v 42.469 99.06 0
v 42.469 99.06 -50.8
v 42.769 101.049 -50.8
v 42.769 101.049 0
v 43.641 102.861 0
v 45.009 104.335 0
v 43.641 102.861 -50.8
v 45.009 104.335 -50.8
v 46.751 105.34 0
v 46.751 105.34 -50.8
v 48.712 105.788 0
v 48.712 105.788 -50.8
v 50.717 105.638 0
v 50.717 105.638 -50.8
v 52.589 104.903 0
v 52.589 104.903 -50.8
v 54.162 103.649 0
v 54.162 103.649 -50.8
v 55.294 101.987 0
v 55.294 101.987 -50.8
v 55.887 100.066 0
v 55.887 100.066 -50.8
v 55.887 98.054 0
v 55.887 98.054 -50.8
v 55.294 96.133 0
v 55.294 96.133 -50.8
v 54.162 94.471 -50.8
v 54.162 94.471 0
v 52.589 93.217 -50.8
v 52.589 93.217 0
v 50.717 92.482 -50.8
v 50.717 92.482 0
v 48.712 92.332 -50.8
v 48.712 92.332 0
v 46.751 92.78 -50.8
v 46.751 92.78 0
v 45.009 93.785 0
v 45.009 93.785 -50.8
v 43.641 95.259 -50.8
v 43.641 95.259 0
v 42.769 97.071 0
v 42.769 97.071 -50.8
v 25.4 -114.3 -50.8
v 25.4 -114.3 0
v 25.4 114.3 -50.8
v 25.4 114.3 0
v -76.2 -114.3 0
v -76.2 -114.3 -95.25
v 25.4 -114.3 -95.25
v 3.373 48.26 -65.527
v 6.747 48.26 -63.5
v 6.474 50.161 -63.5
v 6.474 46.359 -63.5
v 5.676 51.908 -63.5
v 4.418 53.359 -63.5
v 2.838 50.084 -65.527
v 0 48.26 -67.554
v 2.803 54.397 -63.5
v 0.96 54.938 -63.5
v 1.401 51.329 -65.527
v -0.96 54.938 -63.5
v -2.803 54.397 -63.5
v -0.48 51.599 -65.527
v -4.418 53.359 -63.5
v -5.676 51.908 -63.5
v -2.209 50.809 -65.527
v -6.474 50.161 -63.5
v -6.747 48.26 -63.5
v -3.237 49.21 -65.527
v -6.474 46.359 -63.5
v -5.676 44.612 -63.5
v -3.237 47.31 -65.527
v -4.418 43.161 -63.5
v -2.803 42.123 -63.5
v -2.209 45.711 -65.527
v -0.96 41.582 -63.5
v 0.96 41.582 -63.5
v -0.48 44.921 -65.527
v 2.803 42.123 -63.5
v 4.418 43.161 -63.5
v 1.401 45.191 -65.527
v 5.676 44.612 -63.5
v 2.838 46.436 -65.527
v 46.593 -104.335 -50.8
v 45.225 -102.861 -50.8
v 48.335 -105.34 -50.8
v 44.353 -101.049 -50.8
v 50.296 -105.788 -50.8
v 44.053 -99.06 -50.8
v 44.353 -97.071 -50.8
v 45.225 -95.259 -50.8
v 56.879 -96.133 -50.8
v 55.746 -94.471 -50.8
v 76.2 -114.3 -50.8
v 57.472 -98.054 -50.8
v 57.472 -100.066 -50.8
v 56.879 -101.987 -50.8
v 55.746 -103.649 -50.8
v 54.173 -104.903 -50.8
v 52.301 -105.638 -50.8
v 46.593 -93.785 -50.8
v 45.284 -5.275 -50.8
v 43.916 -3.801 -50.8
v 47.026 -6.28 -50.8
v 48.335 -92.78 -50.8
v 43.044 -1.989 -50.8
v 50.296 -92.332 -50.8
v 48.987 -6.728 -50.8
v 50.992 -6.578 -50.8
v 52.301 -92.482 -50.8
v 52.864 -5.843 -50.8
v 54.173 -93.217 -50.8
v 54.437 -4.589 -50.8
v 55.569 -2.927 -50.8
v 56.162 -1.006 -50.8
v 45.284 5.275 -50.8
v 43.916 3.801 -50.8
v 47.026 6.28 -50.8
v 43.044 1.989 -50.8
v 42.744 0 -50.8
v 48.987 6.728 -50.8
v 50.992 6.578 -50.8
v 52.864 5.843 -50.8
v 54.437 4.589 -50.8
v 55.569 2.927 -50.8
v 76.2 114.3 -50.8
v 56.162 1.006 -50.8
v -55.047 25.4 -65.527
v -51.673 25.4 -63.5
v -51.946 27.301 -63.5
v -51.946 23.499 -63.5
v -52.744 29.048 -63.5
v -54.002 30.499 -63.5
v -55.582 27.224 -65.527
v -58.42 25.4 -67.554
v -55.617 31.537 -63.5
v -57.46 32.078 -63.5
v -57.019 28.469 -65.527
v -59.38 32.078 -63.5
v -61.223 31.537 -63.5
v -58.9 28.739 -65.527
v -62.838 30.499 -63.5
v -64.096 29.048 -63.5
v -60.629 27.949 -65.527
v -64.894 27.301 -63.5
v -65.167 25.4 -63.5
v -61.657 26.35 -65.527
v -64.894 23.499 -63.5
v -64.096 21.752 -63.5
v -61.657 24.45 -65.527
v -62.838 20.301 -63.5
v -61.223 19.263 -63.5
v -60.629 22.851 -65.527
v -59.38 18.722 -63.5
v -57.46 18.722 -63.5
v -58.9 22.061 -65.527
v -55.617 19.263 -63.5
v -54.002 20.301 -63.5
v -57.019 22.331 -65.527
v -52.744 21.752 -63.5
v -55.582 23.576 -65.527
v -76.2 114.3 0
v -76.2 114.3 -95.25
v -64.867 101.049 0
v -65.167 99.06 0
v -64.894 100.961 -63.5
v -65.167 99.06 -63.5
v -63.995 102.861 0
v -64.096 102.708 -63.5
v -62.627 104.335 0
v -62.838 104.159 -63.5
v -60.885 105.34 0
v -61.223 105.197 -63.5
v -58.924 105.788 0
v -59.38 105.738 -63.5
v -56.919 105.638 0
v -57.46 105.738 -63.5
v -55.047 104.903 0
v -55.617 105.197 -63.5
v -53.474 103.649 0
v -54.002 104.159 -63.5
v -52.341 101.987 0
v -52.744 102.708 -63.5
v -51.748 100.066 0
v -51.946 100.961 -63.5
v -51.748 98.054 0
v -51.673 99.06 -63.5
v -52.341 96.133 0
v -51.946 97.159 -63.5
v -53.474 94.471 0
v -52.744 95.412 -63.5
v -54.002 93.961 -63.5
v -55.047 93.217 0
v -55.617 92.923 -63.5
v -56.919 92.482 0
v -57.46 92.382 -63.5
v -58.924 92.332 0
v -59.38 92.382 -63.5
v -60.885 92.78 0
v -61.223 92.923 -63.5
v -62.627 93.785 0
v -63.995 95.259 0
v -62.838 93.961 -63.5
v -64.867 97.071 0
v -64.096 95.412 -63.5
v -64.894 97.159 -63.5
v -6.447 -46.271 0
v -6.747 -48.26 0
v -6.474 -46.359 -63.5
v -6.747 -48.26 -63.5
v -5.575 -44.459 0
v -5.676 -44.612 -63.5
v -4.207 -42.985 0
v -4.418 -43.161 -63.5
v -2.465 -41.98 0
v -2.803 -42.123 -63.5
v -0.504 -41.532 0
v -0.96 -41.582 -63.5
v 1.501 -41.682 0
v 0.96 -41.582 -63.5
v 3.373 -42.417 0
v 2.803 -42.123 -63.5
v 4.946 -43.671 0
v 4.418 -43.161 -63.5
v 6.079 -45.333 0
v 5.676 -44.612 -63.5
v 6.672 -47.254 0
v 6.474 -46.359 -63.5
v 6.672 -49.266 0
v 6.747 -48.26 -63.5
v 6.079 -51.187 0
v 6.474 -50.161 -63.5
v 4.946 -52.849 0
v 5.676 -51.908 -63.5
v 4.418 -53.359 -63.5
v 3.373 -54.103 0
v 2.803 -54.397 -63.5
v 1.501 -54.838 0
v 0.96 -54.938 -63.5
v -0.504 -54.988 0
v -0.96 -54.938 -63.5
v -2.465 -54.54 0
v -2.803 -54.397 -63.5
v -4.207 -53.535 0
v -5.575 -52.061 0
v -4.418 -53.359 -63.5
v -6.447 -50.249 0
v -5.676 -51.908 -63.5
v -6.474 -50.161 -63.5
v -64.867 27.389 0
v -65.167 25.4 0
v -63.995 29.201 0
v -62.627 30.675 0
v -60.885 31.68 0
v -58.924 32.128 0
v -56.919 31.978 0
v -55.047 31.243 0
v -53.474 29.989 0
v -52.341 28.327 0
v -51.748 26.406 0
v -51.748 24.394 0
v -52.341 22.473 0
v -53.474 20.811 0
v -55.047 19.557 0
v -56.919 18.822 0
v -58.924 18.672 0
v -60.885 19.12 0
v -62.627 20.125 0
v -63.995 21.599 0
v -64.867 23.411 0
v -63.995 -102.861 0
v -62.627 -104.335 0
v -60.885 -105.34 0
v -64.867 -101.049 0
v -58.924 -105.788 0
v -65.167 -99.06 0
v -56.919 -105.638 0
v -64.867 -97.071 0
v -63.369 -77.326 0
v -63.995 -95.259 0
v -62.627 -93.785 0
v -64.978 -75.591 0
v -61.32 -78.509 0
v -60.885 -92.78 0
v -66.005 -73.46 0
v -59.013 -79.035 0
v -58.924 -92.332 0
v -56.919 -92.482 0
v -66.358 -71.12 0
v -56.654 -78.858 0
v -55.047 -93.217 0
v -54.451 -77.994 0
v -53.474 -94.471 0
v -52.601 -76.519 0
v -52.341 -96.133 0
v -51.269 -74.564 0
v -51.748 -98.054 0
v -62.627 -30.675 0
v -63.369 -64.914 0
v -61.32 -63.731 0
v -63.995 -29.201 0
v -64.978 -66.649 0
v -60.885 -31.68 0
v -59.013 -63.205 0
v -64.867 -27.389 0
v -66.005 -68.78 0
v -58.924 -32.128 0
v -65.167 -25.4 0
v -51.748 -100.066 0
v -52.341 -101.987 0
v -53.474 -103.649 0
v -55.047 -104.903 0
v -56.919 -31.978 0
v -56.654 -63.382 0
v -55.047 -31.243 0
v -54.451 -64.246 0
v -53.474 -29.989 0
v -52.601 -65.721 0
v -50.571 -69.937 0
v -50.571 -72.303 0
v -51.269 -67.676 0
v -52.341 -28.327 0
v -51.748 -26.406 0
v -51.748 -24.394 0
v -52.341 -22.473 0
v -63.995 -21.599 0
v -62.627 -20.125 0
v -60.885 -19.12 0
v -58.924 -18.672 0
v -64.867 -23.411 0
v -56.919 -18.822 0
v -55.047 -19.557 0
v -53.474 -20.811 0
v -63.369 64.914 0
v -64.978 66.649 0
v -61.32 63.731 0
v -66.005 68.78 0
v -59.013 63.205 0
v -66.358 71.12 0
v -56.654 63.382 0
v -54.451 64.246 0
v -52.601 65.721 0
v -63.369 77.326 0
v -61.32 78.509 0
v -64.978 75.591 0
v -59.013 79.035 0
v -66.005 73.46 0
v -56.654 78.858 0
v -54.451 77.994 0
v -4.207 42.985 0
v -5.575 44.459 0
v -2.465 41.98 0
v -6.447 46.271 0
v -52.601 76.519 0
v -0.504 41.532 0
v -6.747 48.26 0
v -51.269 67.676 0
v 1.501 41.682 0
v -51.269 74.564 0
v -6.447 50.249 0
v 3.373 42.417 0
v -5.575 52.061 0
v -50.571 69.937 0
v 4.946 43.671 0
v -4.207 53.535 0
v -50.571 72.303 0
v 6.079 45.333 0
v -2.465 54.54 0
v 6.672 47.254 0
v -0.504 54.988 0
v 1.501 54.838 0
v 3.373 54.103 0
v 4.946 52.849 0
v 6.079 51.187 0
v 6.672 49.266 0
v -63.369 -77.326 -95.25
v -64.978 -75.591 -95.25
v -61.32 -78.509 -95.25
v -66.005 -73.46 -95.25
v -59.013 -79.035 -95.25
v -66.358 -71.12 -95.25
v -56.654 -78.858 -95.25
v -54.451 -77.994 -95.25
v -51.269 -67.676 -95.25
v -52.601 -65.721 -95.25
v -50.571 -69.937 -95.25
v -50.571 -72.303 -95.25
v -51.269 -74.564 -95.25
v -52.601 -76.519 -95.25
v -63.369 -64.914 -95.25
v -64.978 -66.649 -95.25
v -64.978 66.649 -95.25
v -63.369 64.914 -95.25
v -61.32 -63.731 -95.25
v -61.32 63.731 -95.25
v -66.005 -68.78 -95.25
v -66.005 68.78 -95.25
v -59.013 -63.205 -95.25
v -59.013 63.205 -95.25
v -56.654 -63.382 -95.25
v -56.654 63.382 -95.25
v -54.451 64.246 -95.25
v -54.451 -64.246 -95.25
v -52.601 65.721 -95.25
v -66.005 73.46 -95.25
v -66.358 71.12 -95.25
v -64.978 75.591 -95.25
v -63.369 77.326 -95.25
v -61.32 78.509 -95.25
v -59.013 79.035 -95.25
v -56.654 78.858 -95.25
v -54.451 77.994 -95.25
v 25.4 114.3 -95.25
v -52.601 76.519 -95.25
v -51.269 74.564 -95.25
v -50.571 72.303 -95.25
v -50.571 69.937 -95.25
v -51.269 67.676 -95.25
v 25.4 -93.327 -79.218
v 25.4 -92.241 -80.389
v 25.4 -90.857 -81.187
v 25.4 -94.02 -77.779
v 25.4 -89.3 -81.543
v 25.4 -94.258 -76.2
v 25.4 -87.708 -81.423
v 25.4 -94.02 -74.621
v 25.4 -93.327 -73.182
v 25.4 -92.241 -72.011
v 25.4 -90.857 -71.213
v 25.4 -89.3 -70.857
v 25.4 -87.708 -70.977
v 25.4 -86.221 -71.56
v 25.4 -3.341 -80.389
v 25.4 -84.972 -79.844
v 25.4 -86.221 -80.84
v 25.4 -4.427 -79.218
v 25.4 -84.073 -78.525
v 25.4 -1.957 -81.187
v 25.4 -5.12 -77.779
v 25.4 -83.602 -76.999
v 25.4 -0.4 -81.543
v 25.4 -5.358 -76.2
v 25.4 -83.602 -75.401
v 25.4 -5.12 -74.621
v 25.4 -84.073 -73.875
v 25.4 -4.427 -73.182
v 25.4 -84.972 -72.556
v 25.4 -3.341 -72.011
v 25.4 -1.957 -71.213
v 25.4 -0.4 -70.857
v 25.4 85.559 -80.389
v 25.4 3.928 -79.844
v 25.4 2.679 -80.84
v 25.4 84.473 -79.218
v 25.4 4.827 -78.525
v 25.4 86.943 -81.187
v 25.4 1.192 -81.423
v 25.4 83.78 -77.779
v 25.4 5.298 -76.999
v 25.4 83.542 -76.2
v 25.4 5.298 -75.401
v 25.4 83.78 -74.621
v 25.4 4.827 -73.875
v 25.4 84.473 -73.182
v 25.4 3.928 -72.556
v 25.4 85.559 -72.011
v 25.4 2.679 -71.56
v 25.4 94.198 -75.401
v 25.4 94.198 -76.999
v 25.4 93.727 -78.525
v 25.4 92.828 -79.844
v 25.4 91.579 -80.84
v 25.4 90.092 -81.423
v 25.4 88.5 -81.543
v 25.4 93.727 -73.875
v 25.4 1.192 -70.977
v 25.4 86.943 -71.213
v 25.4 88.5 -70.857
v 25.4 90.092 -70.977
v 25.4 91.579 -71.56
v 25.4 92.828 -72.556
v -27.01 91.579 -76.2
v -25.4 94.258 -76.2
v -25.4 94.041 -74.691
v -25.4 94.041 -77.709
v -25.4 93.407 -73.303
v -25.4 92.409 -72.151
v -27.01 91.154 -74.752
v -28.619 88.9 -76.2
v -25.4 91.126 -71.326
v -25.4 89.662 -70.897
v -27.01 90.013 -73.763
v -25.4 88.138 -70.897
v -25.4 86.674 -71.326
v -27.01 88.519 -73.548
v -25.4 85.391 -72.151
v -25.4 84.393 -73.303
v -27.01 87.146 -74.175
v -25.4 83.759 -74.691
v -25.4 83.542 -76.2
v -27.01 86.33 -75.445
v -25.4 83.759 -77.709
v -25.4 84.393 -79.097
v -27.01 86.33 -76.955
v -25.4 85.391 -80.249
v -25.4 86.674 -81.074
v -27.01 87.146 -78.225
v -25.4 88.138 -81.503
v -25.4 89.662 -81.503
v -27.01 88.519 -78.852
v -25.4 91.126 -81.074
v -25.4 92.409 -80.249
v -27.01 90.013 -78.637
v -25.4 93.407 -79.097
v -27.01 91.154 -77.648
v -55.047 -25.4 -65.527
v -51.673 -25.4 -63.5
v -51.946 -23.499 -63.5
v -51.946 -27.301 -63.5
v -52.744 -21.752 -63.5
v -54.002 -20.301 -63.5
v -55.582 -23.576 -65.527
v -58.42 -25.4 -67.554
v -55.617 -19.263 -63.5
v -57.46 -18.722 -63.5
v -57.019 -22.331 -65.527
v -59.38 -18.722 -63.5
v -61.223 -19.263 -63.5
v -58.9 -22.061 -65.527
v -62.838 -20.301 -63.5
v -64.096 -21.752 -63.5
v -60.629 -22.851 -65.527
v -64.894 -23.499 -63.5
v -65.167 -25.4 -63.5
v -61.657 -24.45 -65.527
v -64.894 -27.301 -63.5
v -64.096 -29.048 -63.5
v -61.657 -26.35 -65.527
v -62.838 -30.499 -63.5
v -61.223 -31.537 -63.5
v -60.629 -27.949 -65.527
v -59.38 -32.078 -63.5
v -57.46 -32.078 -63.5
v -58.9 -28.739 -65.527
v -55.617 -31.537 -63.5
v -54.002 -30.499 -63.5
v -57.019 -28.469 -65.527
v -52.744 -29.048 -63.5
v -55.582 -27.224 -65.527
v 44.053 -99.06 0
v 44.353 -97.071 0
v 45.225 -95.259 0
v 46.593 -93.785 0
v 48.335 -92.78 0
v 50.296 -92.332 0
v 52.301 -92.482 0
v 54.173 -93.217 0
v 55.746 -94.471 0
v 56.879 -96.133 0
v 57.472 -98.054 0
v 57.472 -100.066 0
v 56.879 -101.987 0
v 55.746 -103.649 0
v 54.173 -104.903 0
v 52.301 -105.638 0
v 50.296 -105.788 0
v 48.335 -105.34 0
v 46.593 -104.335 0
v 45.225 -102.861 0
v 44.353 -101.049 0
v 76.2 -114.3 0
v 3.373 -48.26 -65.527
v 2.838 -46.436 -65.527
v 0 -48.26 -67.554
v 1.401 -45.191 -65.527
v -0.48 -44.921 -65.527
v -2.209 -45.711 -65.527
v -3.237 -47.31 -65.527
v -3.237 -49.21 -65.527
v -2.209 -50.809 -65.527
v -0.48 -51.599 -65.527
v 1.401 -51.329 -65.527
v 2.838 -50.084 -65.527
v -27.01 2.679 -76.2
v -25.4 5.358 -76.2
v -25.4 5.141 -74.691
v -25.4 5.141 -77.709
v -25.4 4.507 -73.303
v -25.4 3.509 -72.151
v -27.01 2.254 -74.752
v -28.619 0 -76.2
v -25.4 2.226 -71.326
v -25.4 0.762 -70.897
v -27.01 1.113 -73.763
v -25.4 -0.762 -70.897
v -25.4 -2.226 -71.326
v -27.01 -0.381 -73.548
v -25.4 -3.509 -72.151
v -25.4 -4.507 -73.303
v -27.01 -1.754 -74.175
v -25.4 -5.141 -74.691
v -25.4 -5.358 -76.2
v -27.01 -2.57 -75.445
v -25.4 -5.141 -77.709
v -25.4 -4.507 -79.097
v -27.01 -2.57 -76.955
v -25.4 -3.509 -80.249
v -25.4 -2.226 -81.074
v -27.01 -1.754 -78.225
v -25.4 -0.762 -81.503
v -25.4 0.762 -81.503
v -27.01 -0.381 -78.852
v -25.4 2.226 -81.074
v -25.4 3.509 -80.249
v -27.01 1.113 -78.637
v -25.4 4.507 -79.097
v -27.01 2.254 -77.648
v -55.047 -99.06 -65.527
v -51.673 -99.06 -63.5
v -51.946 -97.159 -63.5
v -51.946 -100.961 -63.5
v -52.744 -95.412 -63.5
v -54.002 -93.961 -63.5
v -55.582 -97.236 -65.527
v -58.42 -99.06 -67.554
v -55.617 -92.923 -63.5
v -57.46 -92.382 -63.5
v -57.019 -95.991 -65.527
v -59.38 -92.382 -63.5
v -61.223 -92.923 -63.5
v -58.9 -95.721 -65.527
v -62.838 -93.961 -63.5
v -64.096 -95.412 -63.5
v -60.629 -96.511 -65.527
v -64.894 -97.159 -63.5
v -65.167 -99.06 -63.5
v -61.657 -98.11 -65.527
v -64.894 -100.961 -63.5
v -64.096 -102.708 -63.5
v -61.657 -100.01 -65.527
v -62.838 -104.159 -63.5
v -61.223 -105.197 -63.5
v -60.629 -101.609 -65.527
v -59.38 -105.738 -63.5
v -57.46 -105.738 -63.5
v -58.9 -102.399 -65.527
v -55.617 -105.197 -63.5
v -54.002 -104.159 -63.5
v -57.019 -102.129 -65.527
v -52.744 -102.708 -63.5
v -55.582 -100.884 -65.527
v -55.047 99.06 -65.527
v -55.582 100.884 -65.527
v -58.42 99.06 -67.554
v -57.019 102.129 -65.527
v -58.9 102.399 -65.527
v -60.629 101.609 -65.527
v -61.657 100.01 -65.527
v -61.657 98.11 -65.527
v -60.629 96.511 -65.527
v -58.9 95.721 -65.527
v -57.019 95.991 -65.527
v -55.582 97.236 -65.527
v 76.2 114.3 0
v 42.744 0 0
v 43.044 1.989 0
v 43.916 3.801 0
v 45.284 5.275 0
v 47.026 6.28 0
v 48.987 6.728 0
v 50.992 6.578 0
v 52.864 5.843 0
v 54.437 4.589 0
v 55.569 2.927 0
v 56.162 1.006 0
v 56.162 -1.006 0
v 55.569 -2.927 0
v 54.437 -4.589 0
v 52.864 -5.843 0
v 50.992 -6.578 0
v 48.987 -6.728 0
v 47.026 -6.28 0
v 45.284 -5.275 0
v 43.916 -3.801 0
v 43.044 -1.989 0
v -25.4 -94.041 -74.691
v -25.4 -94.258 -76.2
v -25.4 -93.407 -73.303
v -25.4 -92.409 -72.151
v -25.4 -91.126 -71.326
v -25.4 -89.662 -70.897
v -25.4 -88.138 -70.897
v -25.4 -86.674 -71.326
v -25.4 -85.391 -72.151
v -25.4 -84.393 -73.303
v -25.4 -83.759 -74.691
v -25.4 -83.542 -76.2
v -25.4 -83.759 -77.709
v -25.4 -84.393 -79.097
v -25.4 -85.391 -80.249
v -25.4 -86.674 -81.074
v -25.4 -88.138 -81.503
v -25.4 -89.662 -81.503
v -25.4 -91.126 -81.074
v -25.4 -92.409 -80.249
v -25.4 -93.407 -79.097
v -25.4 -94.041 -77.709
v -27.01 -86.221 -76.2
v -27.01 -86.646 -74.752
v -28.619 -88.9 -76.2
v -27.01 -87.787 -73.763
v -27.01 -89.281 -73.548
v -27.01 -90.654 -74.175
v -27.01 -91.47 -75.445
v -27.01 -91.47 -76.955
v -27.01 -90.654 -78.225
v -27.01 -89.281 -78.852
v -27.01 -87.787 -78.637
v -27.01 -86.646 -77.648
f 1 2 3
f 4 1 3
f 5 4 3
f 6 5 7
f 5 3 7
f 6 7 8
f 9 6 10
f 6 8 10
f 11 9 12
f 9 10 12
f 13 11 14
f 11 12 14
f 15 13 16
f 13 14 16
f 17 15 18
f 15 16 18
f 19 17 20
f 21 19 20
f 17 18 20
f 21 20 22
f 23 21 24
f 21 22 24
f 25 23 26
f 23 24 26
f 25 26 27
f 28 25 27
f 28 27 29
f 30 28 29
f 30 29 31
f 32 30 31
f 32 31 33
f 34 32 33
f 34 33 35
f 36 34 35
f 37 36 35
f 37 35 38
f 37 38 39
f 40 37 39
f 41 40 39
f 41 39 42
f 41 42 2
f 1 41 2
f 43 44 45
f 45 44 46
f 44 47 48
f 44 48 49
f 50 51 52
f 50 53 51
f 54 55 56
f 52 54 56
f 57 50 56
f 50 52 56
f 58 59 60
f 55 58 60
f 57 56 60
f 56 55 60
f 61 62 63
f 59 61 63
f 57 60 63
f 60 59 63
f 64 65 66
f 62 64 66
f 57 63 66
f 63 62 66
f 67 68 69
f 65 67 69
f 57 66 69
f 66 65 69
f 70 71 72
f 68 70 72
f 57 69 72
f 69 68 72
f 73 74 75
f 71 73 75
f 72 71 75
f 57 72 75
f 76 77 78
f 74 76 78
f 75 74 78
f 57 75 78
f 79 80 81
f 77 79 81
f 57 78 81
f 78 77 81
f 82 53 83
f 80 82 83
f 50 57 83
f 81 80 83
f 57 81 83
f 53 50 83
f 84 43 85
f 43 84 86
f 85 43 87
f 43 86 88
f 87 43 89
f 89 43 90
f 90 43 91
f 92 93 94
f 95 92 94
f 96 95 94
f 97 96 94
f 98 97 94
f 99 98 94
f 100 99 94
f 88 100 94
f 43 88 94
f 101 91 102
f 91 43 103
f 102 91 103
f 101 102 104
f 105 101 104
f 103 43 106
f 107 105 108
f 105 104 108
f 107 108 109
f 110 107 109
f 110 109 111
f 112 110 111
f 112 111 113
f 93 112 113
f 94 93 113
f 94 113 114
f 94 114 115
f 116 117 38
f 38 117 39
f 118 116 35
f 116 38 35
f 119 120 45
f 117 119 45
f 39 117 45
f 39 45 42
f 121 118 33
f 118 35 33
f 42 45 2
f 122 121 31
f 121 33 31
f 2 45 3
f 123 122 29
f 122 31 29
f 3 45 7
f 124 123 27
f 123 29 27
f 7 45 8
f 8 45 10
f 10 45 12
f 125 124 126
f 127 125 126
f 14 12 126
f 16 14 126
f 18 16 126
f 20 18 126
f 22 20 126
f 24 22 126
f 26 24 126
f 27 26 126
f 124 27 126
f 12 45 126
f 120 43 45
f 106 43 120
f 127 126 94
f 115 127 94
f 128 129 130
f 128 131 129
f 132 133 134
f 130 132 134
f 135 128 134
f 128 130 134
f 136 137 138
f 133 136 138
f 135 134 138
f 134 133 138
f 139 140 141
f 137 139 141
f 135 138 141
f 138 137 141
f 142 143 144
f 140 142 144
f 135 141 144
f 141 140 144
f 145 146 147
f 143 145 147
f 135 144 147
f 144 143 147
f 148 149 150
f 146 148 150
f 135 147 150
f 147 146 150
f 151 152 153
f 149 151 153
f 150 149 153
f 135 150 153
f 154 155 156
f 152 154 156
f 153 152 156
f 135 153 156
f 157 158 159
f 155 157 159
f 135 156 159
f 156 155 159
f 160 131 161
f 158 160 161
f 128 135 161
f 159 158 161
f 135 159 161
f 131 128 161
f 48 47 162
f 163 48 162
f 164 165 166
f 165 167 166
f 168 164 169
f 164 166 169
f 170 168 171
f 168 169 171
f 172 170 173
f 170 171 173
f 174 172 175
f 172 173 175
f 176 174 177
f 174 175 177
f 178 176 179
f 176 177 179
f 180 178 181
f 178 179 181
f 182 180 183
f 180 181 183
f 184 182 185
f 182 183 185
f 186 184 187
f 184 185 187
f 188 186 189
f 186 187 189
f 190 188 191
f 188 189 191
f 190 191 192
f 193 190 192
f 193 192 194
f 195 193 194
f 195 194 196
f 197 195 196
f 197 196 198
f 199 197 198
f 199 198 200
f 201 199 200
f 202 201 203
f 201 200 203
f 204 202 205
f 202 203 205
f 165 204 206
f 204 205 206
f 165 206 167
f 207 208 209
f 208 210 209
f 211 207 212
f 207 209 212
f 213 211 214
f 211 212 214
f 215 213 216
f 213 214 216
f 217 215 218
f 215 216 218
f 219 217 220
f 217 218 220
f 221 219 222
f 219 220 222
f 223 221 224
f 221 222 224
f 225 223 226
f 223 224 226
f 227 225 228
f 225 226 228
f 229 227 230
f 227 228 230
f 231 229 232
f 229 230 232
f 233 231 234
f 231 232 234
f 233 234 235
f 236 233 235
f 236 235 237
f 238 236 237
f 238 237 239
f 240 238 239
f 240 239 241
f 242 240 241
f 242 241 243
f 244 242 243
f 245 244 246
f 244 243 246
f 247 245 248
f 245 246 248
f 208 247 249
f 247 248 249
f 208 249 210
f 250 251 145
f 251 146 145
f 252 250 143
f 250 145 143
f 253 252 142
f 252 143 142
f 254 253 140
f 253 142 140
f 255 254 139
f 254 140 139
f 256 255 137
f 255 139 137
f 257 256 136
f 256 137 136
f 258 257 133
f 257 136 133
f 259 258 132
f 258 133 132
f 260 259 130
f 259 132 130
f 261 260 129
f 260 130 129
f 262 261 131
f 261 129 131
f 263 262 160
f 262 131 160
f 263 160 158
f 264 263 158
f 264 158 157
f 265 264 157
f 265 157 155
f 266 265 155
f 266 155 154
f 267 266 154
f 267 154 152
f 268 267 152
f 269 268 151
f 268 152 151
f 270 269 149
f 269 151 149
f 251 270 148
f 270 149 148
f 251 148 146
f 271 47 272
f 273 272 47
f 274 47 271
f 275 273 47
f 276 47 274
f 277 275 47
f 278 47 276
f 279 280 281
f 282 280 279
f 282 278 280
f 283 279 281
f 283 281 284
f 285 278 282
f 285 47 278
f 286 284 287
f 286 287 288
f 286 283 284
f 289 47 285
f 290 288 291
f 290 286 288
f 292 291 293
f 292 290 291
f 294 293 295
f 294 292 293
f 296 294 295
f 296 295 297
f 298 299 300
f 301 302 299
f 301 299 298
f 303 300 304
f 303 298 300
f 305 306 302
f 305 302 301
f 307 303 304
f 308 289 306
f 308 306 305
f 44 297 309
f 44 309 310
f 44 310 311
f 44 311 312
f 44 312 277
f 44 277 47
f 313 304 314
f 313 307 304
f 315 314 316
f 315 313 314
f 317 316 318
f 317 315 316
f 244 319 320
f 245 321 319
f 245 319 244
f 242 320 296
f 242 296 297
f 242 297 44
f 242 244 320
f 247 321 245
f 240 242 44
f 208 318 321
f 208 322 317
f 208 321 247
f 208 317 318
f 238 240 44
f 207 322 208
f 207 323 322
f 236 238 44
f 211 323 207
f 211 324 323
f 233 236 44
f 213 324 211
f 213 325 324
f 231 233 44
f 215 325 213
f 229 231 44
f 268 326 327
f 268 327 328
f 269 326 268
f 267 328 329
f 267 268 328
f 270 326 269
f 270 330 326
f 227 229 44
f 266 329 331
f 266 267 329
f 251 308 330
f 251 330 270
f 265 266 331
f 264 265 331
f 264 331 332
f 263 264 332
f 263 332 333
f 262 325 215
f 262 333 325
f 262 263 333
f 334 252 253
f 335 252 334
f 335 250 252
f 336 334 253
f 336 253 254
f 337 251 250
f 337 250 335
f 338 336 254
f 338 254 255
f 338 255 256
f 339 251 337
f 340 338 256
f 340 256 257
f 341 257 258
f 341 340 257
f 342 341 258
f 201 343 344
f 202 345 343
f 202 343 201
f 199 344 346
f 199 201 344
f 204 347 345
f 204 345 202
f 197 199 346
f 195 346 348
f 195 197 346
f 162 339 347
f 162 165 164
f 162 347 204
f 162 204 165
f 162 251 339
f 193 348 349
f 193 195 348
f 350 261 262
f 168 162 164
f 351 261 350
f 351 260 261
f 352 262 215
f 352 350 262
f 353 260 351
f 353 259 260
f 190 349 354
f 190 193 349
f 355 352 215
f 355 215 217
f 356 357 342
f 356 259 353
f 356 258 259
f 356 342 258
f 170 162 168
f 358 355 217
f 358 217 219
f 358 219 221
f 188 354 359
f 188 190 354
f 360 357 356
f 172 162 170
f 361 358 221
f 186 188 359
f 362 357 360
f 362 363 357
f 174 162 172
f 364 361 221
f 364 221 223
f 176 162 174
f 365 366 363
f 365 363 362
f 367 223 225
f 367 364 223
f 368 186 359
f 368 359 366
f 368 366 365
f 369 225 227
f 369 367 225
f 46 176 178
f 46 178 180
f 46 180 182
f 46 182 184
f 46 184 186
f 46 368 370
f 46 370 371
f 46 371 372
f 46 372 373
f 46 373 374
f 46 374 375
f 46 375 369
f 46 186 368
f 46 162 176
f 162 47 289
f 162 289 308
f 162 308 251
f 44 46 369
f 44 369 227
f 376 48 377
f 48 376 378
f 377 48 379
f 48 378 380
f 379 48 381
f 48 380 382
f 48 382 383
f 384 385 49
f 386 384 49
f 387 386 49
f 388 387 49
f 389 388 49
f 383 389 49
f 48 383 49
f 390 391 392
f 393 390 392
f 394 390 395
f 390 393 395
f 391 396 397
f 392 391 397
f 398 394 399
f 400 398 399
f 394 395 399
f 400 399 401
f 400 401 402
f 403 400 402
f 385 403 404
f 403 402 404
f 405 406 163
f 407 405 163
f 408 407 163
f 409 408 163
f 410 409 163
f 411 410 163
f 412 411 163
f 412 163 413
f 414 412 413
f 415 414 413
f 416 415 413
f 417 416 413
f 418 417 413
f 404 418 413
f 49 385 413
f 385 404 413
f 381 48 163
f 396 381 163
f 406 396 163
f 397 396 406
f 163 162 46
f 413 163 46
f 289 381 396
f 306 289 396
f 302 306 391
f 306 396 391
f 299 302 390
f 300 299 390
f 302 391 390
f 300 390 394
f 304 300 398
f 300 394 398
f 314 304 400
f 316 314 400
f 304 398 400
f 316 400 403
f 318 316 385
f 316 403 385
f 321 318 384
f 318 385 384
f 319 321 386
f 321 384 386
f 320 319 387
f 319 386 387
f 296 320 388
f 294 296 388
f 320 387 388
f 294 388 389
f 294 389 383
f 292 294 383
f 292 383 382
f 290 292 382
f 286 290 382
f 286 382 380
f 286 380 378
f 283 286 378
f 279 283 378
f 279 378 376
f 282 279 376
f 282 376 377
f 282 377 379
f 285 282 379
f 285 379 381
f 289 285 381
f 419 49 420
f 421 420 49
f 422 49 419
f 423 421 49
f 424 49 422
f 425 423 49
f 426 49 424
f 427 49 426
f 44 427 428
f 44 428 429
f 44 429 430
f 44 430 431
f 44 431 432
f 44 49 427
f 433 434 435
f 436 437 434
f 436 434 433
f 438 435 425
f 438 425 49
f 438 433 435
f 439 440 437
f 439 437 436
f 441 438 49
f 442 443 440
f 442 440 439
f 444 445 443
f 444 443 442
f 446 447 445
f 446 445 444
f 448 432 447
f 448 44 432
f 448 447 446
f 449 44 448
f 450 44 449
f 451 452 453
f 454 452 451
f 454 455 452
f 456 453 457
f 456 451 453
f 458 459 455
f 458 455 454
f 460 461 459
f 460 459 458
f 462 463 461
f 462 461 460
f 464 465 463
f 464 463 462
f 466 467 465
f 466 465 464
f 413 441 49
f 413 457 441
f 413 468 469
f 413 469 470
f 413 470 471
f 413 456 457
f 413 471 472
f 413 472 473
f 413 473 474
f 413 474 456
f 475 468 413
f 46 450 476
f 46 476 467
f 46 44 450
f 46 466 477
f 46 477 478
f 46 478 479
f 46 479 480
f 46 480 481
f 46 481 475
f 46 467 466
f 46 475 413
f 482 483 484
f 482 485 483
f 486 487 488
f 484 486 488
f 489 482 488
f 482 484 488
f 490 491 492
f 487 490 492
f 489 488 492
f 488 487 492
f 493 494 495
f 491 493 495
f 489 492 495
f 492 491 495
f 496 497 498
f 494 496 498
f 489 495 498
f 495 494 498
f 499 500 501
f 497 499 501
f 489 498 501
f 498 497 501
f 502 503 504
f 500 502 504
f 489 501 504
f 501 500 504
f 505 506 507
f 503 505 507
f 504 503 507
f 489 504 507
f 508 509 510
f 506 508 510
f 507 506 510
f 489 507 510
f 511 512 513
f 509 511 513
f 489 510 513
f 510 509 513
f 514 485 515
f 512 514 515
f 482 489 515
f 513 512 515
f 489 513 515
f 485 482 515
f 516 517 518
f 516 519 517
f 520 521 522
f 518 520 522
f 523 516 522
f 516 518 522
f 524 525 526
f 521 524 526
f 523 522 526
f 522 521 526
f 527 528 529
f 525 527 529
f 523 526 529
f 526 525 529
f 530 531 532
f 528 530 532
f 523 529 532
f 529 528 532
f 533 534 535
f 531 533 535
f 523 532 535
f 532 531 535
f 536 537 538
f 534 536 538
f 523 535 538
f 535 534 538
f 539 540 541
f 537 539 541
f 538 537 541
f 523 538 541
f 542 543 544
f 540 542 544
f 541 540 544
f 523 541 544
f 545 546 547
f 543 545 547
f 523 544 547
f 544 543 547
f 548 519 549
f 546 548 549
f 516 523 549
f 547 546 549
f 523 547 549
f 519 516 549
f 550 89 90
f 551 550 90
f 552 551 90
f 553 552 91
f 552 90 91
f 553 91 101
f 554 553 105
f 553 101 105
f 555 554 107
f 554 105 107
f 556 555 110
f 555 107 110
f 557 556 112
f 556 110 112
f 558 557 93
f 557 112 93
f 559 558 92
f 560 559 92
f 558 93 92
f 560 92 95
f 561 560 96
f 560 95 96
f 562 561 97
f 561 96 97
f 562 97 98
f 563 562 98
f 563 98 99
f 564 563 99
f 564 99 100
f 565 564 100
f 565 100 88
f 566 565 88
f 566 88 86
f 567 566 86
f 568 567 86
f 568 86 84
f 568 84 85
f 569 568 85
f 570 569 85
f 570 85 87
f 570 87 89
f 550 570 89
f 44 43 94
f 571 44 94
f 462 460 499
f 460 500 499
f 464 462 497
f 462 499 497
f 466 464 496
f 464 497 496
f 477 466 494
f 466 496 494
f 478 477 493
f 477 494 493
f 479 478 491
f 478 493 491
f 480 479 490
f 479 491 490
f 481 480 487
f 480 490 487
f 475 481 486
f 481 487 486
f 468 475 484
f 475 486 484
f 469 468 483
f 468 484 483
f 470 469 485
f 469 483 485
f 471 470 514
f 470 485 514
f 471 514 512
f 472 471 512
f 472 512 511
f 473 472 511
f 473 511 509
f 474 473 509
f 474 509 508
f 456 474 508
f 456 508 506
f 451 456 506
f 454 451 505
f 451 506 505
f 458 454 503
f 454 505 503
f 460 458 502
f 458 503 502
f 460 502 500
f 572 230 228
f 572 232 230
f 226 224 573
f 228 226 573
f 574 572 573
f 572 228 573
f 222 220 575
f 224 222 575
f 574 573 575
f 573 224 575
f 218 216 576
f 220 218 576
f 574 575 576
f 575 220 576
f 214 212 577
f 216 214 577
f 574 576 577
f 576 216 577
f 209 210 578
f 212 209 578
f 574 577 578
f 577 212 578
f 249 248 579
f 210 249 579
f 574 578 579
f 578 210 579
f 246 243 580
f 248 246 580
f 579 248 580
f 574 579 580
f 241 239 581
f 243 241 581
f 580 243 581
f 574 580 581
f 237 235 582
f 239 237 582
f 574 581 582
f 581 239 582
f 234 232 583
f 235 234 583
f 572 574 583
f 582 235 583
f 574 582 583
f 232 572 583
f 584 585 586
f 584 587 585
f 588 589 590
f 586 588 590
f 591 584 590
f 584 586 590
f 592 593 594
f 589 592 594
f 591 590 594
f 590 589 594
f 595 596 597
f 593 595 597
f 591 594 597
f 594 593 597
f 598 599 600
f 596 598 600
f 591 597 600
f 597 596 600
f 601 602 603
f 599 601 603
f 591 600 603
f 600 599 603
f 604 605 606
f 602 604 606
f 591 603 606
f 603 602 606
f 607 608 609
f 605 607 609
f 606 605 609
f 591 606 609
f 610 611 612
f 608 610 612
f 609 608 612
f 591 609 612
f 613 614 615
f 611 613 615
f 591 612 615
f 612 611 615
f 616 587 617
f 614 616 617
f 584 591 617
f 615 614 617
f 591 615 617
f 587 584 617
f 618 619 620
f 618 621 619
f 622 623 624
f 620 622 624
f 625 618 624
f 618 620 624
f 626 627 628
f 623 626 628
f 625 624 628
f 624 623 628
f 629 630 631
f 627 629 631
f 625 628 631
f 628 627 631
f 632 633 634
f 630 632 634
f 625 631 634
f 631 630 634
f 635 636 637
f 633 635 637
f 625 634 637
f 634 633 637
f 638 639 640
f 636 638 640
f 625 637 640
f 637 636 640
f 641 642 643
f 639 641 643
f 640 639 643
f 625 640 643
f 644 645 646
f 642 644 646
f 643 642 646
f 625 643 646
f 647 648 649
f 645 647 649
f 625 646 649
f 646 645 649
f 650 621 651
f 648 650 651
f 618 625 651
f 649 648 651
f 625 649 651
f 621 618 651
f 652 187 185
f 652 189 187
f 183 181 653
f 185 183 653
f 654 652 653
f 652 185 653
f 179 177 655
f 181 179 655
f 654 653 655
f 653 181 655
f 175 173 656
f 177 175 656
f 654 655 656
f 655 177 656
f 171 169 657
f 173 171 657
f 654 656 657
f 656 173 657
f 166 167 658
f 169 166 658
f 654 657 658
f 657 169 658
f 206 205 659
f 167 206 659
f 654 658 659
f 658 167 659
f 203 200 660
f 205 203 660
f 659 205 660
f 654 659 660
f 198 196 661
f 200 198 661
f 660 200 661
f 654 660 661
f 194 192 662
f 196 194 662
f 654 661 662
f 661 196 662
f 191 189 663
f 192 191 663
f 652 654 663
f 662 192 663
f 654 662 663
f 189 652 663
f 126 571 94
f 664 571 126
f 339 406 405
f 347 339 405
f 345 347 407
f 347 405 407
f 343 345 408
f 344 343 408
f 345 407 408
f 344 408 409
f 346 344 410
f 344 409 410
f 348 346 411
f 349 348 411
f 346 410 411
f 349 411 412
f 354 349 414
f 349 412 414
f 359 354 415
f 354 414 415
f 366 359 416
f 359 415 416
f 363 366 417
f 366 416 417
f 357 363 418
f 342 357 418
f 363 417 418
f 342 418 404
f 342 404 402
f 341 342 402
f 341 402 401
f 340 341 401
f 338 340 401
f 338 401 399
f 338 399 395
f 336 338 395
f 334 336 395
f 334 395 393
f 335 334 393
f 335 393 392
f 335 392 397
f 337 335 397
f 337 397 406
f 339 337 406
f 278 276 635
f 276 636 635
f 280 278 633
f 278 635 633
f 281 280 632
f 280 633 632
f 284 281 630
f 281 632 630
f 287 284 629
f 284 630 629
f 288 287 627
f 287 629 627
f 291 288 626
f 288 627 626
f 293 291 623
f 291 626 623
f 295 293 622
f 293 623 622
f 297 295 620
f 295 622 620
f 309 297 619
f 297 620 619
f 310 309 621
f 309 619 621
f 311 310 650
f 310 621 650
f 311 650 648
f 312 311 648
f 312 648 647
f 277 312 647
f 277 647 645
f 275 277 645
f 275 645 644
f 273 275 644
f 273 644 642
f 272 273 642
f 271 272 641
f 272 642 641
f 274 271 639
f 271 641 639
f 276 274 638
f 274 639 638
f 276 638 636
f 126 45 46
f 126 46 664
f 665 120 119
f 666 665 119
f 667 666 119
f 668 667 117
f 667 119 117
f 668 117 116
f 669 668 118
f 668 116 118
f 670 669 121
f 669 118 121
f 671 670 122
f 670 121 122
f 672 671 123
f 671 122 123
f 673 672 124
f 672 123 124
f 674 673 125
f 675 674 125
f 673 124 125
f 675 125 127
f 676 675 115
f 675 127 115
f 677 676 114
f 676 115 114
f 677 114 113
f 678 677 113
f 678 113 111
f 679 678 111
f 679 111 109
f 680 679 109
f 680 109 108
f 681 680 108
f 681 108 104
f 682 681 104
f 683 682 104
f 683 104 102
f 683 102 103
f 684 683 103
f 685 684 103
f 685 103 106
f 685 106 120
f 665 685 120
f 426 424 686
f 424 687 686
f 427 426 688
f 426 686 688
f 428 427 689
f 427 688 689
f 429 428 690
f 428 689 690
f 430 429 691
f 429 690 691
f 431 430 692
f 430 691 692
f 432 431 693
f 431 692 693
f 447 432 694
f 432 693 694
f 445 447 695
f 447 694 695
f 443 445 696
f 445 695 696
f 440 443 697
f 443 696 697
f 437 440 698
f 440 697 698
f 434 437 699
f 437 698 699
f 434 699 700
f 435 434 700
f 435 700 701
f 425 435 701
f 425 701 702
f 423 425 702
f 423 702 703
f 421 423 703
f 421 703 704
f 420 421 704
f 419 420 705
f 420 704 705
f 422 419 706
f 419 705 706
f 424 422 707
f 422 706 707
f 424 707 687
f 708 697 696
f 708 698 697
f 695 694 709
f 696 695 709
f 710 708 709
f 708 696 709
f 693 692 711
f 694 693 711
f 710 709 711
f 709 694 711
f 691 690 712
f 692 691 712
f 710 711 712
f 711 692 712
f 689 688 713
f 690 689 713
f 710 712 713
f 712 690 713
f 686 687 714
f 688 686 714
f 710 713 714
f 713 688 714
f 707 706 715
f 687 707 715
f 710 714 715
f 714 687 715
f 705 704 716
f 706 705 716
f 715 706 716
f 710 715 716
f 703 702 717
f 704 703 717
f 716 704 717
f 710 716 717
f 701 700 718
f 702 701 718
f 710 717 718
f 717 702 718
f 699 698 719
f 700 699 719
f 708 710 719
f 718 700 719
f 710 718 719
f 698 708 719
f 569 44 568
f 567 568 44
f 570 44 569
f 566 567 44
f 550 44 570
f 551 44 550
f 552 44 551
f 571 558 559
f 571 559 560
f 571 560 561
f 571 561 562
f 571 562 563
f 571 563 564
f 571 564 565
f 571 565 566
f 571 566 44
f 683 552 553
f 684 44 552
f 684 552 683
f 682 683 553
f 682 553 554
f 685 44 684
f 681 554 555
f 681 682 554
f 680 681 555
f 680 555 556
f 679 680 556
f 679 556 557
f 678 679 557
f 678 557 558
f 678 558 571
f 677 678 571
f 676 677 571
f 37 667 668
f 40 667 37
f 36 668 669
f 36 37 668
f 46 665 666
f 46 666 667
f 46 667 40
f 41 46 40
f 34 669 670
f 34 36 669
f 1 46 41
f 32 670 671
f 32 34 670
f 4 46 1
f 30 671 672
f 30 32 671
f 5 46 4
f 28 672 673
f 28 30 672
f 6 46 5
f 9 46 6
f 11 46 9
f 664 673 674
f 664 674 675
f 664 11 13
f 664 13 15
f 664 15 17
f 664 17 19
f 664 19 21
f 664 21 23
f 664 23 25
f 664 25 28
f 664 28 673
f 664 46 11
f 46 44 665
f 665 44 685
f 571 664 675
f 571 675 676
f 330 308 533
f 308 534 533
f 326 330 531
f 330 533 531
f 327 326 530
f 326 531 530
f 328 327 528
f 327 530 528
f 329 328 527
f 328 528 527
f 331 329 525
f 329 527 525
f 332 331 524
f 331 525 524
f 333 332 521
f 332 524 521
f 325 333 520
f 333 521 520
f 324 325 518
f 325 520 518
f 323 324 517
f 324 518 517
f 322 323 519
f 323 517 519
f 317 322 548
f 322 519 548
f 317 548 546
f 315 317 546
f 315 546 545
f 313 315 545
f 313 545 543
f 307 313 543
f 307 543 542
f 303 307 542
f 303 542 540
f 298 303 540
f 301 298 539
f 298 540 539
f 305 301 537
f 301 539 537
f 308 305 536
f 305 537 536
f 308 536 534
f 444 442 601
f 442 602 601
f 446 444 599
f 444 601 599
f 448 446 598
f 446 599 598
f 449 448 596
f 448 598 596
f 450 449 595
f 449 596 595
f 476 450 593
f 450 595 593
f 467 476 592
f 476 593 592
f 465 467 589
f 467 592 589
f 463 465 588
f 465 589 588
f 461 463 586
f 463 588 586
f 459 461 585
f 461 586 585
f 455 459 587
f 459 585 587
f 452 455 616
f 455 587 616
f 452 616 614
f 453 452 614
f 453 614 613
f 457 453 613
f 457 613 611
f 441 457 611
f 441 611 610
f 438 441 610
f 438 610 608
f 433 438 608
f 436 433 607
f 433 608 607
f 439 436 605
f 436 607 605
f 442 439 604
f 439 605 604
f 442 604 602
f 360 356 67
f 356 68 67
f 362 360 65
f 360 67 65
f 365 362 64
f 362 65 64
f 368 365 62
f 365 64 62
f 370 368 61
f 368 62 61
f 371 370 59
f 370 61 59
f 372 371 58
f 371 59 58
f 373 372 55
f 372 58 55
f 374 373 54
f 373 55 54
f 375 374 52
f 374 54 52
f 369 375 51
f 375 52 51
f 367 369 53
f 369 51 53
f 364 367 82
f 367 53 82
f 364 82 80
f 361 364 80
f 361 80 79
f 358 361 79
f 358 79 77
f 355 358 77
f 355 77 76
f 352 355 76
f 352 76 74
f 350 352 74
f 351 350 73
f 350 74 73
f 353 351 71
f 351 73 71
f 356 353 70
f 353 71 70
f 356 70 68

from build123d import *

# Parameters (mm, degrees)
F0_W     = 101.6
F0_H     = 228.6
F1_DEPTH = 95.25
F0_W_2   = 50.8
F2_DEPTH = 50.8
F4_D     = 13.49375
F4_DEPTH = 63.5
F4_TIP   = 4.053931489
F5_D     = 13.49375
F5_DEPTH = 63.5
F5_TIP   = 4.053931489
F6_D     = 15.875
F8_D     = 10.715625
F8_DEPTH = 50.8
F8_TIP   = 3.2192985354


with BuildPart() as f1:
    # F0 (on Top) → F1 (new body)
    with BuildSketch(Plane.XY):
        with Locations((-25.4, 0)):
            Rectangle(F0_W, F0_H)
    extrude(amount=-F1_DEPTH)

    # F4
    with Locations(Plane.XY):
        with Locations((-58.42, 99.06), (-58.42, 25.4), (-58.42, -25.4), (-58.42, -99.06), (50.8, -99.06), (49.4907237589, 0), (49.2157712579, 99.06), (0, 48.26), (0, -48.26)):
            Hole(F4_D / 2, depth=F4_DEPTH)
            with Locations((0, 0, -(F4_DEPTH + F4_TIP / 2))):  # 118° drill point
                Cone(0, F4_D / 2, F4_TIP, mode=Mode.SUBTRACT)

    # F6 (through all)
    with Locations(Plane.XY):
        with Locations((-58.42, 71.12), (-58.42, -71.12)):
            Hole(F6_D / 2)

    # F8
    with Locations(Plane.YZ.offset(25.4)):
        with Locations((-88.9, -76.2), (0, -76.2), (88.9, -76.2)):
            Hole(F8_D / 2, depth=F8_DEPTH)
            with Locations((0, 0, -(F8_DEPTH + F8_TIP / 2))):  # 118° drill point
                Cone(0, F8_D / 2, F8_TIP, mode=Mode.SUBTRACT)


with BuildPart() as f2:
    # F0 (on Top) → F2 (new body)
    with BuildSketch(Plane.XY):
        with Locations((50.8, 0)):
            Rectangle(F0_W_2, F0_H)
    extrude(amount=-F2_DEPTH)

    # F5
    with Locations(Plane.XY):
        with Locations((49.2157712579, 99.06), (49.4907237589, 0), (50.8, -99.06)):
            Hole(F5_D / 2, depth=F5_DEPTH)
            with Locations((0, 0, -(F5_DEPTH + F5_TIP / 2))):  # 118° drill point
                Cone(0, F5_D / 2, F5_TIP, mode=Mode.SUBTRACT)


solid = Compound([f1.part, f2.part])
